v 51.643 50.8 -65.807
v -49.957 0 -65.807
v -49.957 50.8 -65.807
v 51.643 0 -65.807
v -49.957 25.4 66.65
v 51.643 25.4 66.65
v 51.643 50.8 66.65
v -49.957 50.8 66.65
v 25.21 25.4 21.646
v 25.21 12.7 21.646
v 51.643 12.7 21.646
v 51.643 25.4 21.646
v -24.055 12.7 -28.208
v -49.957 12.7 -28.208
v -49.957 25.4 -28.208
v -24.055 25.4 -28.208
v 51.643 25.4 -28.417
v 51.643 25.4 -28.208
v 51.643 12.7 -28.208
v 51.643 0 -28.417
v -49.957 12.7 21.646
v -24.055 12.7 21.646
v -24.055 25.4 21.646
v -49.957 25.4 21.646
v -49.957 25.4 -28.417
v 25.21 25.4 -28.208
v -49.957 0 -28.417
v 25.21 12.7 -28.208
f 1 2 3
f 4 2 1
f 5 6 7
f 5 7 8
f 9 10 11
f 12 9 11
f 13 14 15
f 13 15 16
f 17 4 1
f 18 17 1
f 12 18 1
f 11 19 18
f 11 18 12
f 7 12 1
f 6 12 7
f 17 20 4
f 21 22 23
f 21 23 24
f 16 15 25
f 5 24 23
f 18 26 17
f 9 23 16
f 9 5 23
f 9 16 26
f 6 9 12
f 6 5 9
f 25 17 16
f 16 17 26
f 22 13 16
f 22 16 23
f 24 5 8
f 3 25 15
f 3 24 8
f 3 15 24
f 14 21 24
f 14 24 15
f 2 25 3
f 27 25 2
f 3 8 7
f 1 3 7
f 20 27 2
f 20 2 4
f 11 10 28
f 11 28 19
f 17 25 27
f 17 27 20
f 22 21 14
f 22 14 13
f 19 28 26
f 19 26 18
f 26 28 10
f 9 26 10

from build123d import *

# Parameters (mm, degrees)
F0_W     = 21.0800419182
F0_H     = 51.430279389
F0_W_2   = 21.0800442
F1_DEPTH = 50.8
F2_W     = 26.432774961
F2_H     = 49.8542264104
F3_DEPTH = 12.7
F4_W     = 102.5741808116
F4_H     = 37.7440936863
F5_DEPTH = 25.4
F6_DEPTH = 25.4
F7_DEPTH = 25.4


with BuildPart() as f1:
    # F0 (on Front) → F1 (new body)
    with BuildSketch(Plane.XZ):
        with Locations((-39.4168676153, -2.9509169981)):
            Rectangle(F0_W, F0_H)
        with Locations((41.1030893256, -2.9509169981)):
            Rectangle(F0_W_2, F0_H)
        Polygon((51.6431114256, 66.6497073153), (-49.9568885744, 66.6497073153), (-49.9568885744, 22.7642226964), (-28.8768466562, 22.7642226964), (-28.8768466562, -28.6660566926), (30.5630672256, -28.6660566926), (30.5630672256, 22.7642226964), (51.6431114256, 22.7642226964), align=None)
        Polygon((-28.8768466562, -28.6660566926), (-49.9568885744, -28.6660566926), (-49.9568885744, -65.8065884391), (51.6431114256, -65.8065884391), (51.6431114256, -28.6660566926), (30.5630672256, -28.6660566926), align=None)
    extrude(amount=-F1_DEPTH)

    # F2 (on Front) → F3 (cut)
    with BuildSketch(Plane.XZ):
        with Locations((38.4267239451, -3.2813642174)):
            Rectangle(F2_W, F2_H)
        Polygon((-50.4875965416, -28.2084774226), (-50.1530058682, -28.2084774226), (-24.0548325416, -28.2084774226), (-24.0548325416, 21.6457535774), (-50.4875965416, 21.6457535774), align=None)
    extrude(amount=-F3_DEPTH, mode=Mode.SUBTRACT)

    # F4 (on Front) → F5 (join)
    with BuildSketch(Plane.XZ):
        with Locations((0.5936603993, -47.2895335406)):
            Rectangle(F4_W, F4_H)
    extrude(amount=F5_DEPTH)

    # F6 (cut): a face of the model
    f6_faces = [f1.faces().sort_by_distance(p)[0] for p in [
        (0.7506624664, 0, 27.4054577125),
    ]]
    extrude(f6_faces, amount=-F6_DEPTH, mode=Mode.SUBTRACT)

    # F7 (cut): a face of the model
    f7_faces = [f1.faces().sort_by_distance(p)[0] for p in [
        (0.5936603993, -25.4, -47.2895335406),
    ]]
    extrude(f7_faces, amount=-F7_DEPTH, mode=Mode.SUBTRACT)


solid = f1.part
